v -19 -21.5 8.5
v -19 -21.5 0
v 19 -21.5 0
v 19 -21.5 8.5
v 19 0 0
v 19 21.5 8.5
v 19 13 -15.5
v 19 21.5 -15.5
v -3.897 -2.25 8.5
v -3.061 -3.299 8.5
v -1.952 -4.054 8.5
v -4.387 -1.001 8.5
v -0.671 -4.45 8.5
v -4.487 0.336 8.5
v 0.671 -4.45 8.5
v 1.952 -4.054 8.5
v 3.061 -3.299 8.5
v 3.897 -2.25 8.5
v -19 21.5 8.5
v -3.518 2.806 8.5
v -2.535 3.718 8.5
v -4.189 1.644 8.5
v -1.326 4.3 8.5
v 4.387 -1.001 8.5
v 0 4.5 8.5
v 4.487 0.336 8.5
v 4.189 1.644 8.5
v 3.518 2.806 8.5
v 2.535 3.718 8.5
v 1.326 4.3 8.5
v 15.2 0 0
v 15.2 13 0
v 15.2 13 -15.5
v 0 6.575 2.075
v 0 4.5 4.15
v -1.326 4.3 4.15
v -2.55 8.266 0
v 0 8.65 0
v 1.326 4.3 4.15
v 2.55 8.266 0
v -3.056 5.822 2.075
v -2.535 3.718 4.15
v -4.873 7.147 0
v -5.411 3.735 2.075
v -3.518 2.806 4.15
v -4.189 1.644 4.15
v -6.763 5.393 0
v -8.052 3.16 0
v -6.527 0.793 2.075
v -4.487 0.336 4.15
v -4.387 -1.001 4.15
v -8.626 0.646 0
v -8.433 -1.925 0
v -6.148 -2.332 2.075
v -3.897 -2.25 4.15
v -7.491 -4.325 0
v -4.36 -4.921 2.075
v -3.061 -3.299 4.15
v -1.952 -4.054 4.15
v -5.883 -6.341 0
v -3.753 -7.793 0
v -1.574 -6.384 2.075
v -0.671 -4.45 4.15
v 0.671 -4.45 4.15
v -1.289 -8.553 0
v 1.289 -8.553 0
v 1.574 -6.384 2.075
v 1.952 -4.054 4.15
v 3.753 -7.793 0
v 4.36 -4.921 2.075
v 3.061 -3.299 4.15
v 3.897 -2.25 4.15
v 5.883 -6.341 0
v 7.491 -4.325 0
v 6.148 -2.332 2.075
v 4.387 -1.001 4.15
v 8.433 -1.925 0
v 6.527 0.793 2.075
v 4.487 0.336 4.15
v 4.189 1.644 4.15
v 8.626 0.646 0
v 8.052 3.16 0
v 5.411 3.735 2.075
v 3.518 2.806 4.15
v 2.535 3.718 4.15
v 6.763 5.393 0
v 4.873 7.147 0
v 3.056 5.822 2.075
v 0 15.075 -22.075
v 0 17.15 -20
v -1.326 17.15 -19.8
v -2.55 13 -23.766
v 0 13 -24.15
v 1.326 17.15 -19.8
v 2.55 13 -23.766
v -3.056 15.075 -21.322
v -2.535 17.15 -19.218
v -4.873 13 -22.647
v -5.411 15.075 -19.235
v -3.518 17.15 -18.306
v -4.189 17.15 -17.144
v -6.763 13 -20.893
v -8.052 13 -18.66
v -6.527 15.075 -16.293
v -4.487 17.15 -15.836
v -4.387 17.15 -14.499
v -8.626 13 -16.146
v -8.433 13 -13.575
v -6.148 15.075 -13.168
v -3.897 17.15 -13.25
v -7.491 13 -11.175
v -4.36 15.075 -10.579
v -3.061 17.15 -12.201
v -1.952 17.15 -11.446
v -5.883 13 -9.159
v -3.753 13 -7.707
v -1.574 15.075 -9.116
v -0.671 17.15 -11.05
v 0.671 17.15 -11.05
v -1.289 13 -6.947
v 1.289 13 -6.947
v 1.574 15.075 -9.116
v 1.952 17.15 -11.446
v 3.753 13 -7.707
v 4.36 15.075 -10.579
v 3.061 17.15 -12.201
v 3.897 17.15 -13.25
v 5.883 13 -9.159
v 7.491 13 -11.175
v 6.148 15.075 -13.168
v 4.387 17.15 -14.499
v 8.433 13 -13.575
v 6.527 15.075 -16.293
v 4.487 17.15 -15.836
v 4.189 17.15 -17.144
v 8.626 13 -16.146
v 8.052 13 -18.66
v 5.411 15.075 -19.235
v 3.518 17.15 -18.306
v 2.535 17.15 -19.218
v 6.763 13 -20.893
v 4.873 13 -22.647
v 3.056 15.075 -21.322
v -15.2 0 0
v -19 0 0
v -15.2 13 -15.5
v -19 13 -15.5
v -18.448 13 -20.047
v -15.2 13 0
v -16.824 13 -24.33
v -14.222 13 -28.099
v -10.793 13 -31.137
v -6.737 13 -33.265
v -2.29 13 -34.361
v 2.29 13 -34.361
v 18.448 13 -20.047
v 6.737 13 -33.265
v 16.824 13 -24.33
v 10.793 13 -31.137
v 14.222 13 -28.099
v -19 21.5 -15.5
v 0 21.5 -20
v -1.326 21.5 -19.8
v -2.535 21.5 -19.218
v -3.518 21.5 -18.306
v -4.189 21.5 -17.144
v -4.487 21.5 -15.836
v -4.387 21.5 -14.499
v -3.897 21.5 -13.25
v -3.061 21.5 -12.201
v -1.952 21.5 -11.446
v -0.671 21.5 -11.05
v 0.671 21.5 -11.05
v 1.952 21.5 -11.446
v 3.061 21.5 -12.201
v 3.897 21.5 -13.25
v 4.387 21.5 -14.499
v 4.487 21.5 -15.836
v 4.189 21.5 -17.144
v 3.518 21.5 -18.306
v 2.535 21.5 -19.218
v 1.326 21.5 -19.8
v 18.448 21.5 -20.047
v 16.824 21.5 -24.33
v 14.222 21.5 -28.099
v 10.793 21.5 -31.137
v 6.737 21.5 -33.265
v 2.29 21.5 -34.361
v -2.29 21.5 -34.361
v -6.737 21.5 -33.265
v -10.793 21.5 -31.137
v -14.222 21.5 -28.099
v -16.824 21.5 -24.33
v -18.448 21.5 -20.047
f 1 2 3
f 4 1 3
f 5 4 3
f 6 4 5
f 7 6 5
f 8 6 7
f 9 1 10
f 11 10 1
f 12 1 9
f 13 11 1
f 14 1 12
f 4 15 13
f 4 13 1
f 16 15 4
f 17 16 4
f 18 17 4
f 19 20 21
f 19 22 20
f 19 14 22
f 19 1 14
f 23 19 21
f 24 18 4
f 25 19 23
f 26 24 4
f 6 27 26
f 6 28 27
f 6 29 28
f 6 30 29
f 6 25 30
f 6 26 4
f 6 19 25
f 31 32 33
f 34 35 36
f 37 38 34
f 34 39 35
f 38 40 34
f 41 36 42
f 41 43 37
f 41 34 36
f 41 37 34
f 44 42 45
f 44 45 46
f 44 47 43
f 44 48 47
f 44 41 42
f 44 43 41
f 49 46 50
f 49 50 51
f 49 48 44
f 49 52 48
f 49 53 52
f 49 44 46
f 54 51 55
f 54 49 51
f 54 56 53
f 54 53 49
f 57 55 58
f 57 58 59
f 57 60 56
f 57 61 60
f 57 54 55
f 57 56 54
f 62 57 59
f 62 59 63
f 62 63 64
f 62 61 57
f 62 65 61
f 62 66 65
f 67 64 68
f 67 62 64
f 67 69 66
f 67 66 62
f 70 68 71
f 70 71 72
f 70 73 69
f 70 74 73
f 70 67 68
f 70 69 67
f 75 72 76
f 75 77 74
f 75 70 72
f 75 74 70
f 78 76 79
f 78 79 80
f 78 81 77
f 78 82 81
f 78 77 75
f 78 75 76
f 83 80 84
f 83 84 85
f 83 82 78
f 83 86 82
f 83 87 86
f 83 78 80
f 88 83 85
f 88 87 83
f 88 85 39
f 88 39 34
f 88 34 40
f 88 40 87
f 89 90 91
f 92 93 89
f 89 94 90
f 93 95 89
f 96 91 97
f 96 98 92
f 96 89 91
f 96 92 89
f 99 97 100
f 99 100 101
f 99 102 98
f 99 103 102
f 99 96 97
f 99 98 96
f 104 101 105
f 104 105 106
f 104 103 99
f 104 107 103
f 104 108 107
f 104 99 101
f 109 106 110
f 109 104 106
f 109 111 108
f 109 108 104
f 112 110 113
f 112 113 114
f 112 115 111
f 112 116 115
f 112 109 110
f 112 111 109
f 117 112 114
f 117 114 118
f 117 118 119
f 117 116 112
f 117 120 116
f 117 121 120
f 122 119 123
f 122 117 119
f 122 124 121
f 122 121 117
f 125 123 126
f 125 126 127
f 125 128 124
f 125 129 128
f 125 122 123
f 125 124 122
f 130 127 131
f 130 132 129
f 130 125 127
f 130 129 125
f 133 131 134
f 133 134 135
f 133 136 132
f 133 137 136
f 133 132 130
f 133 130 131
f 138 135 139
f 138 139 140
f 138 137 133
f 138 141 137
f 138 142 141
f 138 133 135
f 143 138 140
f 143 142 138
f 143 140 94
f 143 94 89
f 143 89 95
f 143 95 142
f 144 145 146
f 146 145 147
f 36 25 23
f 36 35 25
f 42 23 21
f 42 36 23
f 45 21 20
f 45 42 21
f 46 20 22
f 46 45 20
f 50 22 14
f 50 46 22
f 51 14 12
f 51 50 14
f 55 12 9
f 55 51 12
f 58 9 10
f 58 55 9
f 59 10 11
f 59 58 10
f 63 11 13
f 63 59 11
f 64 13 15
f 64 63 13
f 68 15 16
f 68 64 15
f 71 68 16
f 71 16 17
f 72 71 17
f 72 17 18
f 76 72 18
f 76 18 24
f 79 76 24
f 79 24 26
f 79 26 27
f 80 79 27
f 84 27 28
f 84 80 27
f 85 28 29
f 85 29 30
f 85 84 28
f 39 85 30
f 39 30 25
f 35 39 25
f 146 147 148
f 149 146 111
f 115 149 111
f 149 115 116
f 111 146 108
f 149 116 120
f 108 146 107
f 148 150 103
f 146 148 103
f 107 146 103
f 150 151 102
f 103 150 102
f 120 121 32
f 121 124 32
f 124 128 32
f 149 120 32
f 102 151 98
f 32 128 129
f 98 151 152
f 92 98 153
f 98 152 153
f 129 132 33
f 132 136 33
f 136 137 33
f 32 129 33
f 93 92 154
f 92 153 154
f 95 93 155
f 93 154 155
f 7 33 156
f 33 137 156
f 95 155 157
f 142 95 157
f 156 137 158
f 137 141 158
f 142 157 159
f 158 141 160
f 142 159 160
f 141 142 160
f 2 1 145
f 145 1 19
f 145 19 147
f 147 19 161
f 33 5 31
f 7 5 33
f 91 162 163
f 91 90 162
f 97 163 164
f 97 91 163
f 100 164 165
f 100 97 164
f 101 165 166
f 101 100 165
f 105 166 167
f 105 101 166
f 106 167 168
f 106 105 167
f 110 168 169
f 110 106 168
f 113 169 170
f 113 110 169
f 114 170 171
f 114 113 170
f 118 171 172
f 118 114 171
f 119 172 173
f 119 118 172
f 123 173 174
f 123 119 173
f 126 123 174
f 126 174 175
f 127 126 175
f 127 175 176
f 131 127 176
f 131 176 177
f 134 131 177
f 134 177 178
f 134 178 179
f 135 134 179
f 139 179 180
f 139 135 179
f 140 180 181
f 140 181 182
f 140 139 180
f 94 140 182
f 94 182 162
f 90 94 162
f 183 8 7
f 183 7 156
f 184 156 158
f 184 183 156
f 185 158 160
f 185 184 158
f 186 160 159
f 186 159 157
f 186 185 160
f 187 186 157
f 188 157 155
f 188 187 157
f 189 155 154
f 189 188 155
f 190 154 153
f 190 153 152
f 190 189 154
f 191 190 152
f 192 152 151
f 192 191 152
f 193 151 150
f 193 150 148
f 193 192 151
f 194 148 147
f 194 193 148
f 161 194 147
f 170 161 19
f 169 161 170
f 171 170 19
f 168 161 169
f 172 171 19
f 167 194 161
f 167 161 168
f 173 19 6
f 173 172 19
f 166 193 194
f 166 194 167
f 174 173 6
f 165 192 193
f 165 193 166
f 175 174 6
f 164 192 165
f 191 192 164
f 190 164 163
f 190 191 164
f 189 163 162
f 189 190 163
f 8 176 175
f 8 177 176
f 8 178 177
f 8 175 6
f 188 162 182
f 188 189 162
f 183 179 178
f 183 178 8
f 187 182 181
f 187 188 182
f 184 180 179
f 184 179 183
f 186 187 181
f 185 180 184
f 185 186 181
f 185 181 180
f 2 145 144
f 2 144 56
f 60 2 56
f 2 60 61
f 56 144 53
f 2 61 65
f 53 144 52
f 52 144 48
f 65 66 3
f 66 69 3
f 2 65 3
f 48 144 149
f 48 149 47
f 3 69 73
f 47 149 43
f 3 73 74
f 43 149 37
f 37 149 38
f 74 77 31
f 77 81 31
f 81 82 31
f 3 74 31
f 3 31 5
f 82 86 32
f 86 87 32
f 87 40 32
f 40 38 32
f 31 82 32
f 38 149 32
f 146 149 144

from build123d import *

# Parameters (mm, degrees)
SKETCH_1_W      = 38
SKETCH_1_H      = 43
EXTRUDE_1_DEPTH = 8.5
EXTRUDE_2_DEPTH = 8.5
EXTRUDE_3_DEPTH = 3.8


with BuildPart() as part:
    # 草图1 → 凸台-拉伸1 (new body)
    with BuildSketch(Plane.XY):
        Rectangle(SKETCH_1_W, SKETCH_1_H)
    extrude(amount=EXTRUDE_1_DEPTH)

    # 草图2 → 凸台-拉伸2 (add)
    with BuildSketch(Plane(origin=(0, 21.5, 0), x_dir=(1, 0, 0), z_dir=(0, 1, 0))):
        with BuildLine():
            Line((-19, -8.5), (19, -8.5))
            Line((19, -8.5), (19, 15.5))
            ThreePointArc((19, 15.5), (0, 34.5), (-19, 15.5))
            Line((-19, 15.5), (-19, -8.5))
        make_face()
    extrude(amount=-EXTRUDE_2_DEPTH)

    # 草图5 → 凸台-拉伸3 (add)
    with BuildSketch(Plane(origin=(19, 0, 0), x_dir=(0, 0, -1), z_dir=(1, 0, 0))):
        Polygon((15.5, 13), (0, 13), (0, 0), align=None)
    extrude_3 = extrude(amount=-EXTRUDE_3_DEPTH)

    # 镜向1: 凸台-拉伸3 across plane
    add(extrude_3.mirror(Plane(origin=(0, 0, 0), x_dir=(0, 0, 1), z_dir=(1, 0, 0))))

    # 草图6 → M8 平锥沉头螺钉的锥形沉头孔1 (revolve, cut)
    with BuildSketch(Plane.YZ):
        Polygon((0, 0), (0, 8.5), (4.5, 8.5), (4.5, 4.15), (8.65, 0), align=None)
    revolve(axis=Axis((0, 0, -6.35), (0, 0, 1)), mode=Mode.SUBTRACT)

    # 草图8 → M8 平锥沉头螺钉的锥形沉头孔2 (revolve, cut)
    with BuildSketch(Plane(origin=(0, 13, -15.5), x_dir=(0, 0, -1), z_dir=(1, 0, 0))):
        Polygon((0, 0), (0, 8.5), (4.5, 8.5), (4.5, 4.15), (8.65, 0), align=None)
    revolve(axis=Axis((0, 6.65, -15.5), (0, 1, 0)), mode=Mode.SUBTRACT)


solid = part.part
